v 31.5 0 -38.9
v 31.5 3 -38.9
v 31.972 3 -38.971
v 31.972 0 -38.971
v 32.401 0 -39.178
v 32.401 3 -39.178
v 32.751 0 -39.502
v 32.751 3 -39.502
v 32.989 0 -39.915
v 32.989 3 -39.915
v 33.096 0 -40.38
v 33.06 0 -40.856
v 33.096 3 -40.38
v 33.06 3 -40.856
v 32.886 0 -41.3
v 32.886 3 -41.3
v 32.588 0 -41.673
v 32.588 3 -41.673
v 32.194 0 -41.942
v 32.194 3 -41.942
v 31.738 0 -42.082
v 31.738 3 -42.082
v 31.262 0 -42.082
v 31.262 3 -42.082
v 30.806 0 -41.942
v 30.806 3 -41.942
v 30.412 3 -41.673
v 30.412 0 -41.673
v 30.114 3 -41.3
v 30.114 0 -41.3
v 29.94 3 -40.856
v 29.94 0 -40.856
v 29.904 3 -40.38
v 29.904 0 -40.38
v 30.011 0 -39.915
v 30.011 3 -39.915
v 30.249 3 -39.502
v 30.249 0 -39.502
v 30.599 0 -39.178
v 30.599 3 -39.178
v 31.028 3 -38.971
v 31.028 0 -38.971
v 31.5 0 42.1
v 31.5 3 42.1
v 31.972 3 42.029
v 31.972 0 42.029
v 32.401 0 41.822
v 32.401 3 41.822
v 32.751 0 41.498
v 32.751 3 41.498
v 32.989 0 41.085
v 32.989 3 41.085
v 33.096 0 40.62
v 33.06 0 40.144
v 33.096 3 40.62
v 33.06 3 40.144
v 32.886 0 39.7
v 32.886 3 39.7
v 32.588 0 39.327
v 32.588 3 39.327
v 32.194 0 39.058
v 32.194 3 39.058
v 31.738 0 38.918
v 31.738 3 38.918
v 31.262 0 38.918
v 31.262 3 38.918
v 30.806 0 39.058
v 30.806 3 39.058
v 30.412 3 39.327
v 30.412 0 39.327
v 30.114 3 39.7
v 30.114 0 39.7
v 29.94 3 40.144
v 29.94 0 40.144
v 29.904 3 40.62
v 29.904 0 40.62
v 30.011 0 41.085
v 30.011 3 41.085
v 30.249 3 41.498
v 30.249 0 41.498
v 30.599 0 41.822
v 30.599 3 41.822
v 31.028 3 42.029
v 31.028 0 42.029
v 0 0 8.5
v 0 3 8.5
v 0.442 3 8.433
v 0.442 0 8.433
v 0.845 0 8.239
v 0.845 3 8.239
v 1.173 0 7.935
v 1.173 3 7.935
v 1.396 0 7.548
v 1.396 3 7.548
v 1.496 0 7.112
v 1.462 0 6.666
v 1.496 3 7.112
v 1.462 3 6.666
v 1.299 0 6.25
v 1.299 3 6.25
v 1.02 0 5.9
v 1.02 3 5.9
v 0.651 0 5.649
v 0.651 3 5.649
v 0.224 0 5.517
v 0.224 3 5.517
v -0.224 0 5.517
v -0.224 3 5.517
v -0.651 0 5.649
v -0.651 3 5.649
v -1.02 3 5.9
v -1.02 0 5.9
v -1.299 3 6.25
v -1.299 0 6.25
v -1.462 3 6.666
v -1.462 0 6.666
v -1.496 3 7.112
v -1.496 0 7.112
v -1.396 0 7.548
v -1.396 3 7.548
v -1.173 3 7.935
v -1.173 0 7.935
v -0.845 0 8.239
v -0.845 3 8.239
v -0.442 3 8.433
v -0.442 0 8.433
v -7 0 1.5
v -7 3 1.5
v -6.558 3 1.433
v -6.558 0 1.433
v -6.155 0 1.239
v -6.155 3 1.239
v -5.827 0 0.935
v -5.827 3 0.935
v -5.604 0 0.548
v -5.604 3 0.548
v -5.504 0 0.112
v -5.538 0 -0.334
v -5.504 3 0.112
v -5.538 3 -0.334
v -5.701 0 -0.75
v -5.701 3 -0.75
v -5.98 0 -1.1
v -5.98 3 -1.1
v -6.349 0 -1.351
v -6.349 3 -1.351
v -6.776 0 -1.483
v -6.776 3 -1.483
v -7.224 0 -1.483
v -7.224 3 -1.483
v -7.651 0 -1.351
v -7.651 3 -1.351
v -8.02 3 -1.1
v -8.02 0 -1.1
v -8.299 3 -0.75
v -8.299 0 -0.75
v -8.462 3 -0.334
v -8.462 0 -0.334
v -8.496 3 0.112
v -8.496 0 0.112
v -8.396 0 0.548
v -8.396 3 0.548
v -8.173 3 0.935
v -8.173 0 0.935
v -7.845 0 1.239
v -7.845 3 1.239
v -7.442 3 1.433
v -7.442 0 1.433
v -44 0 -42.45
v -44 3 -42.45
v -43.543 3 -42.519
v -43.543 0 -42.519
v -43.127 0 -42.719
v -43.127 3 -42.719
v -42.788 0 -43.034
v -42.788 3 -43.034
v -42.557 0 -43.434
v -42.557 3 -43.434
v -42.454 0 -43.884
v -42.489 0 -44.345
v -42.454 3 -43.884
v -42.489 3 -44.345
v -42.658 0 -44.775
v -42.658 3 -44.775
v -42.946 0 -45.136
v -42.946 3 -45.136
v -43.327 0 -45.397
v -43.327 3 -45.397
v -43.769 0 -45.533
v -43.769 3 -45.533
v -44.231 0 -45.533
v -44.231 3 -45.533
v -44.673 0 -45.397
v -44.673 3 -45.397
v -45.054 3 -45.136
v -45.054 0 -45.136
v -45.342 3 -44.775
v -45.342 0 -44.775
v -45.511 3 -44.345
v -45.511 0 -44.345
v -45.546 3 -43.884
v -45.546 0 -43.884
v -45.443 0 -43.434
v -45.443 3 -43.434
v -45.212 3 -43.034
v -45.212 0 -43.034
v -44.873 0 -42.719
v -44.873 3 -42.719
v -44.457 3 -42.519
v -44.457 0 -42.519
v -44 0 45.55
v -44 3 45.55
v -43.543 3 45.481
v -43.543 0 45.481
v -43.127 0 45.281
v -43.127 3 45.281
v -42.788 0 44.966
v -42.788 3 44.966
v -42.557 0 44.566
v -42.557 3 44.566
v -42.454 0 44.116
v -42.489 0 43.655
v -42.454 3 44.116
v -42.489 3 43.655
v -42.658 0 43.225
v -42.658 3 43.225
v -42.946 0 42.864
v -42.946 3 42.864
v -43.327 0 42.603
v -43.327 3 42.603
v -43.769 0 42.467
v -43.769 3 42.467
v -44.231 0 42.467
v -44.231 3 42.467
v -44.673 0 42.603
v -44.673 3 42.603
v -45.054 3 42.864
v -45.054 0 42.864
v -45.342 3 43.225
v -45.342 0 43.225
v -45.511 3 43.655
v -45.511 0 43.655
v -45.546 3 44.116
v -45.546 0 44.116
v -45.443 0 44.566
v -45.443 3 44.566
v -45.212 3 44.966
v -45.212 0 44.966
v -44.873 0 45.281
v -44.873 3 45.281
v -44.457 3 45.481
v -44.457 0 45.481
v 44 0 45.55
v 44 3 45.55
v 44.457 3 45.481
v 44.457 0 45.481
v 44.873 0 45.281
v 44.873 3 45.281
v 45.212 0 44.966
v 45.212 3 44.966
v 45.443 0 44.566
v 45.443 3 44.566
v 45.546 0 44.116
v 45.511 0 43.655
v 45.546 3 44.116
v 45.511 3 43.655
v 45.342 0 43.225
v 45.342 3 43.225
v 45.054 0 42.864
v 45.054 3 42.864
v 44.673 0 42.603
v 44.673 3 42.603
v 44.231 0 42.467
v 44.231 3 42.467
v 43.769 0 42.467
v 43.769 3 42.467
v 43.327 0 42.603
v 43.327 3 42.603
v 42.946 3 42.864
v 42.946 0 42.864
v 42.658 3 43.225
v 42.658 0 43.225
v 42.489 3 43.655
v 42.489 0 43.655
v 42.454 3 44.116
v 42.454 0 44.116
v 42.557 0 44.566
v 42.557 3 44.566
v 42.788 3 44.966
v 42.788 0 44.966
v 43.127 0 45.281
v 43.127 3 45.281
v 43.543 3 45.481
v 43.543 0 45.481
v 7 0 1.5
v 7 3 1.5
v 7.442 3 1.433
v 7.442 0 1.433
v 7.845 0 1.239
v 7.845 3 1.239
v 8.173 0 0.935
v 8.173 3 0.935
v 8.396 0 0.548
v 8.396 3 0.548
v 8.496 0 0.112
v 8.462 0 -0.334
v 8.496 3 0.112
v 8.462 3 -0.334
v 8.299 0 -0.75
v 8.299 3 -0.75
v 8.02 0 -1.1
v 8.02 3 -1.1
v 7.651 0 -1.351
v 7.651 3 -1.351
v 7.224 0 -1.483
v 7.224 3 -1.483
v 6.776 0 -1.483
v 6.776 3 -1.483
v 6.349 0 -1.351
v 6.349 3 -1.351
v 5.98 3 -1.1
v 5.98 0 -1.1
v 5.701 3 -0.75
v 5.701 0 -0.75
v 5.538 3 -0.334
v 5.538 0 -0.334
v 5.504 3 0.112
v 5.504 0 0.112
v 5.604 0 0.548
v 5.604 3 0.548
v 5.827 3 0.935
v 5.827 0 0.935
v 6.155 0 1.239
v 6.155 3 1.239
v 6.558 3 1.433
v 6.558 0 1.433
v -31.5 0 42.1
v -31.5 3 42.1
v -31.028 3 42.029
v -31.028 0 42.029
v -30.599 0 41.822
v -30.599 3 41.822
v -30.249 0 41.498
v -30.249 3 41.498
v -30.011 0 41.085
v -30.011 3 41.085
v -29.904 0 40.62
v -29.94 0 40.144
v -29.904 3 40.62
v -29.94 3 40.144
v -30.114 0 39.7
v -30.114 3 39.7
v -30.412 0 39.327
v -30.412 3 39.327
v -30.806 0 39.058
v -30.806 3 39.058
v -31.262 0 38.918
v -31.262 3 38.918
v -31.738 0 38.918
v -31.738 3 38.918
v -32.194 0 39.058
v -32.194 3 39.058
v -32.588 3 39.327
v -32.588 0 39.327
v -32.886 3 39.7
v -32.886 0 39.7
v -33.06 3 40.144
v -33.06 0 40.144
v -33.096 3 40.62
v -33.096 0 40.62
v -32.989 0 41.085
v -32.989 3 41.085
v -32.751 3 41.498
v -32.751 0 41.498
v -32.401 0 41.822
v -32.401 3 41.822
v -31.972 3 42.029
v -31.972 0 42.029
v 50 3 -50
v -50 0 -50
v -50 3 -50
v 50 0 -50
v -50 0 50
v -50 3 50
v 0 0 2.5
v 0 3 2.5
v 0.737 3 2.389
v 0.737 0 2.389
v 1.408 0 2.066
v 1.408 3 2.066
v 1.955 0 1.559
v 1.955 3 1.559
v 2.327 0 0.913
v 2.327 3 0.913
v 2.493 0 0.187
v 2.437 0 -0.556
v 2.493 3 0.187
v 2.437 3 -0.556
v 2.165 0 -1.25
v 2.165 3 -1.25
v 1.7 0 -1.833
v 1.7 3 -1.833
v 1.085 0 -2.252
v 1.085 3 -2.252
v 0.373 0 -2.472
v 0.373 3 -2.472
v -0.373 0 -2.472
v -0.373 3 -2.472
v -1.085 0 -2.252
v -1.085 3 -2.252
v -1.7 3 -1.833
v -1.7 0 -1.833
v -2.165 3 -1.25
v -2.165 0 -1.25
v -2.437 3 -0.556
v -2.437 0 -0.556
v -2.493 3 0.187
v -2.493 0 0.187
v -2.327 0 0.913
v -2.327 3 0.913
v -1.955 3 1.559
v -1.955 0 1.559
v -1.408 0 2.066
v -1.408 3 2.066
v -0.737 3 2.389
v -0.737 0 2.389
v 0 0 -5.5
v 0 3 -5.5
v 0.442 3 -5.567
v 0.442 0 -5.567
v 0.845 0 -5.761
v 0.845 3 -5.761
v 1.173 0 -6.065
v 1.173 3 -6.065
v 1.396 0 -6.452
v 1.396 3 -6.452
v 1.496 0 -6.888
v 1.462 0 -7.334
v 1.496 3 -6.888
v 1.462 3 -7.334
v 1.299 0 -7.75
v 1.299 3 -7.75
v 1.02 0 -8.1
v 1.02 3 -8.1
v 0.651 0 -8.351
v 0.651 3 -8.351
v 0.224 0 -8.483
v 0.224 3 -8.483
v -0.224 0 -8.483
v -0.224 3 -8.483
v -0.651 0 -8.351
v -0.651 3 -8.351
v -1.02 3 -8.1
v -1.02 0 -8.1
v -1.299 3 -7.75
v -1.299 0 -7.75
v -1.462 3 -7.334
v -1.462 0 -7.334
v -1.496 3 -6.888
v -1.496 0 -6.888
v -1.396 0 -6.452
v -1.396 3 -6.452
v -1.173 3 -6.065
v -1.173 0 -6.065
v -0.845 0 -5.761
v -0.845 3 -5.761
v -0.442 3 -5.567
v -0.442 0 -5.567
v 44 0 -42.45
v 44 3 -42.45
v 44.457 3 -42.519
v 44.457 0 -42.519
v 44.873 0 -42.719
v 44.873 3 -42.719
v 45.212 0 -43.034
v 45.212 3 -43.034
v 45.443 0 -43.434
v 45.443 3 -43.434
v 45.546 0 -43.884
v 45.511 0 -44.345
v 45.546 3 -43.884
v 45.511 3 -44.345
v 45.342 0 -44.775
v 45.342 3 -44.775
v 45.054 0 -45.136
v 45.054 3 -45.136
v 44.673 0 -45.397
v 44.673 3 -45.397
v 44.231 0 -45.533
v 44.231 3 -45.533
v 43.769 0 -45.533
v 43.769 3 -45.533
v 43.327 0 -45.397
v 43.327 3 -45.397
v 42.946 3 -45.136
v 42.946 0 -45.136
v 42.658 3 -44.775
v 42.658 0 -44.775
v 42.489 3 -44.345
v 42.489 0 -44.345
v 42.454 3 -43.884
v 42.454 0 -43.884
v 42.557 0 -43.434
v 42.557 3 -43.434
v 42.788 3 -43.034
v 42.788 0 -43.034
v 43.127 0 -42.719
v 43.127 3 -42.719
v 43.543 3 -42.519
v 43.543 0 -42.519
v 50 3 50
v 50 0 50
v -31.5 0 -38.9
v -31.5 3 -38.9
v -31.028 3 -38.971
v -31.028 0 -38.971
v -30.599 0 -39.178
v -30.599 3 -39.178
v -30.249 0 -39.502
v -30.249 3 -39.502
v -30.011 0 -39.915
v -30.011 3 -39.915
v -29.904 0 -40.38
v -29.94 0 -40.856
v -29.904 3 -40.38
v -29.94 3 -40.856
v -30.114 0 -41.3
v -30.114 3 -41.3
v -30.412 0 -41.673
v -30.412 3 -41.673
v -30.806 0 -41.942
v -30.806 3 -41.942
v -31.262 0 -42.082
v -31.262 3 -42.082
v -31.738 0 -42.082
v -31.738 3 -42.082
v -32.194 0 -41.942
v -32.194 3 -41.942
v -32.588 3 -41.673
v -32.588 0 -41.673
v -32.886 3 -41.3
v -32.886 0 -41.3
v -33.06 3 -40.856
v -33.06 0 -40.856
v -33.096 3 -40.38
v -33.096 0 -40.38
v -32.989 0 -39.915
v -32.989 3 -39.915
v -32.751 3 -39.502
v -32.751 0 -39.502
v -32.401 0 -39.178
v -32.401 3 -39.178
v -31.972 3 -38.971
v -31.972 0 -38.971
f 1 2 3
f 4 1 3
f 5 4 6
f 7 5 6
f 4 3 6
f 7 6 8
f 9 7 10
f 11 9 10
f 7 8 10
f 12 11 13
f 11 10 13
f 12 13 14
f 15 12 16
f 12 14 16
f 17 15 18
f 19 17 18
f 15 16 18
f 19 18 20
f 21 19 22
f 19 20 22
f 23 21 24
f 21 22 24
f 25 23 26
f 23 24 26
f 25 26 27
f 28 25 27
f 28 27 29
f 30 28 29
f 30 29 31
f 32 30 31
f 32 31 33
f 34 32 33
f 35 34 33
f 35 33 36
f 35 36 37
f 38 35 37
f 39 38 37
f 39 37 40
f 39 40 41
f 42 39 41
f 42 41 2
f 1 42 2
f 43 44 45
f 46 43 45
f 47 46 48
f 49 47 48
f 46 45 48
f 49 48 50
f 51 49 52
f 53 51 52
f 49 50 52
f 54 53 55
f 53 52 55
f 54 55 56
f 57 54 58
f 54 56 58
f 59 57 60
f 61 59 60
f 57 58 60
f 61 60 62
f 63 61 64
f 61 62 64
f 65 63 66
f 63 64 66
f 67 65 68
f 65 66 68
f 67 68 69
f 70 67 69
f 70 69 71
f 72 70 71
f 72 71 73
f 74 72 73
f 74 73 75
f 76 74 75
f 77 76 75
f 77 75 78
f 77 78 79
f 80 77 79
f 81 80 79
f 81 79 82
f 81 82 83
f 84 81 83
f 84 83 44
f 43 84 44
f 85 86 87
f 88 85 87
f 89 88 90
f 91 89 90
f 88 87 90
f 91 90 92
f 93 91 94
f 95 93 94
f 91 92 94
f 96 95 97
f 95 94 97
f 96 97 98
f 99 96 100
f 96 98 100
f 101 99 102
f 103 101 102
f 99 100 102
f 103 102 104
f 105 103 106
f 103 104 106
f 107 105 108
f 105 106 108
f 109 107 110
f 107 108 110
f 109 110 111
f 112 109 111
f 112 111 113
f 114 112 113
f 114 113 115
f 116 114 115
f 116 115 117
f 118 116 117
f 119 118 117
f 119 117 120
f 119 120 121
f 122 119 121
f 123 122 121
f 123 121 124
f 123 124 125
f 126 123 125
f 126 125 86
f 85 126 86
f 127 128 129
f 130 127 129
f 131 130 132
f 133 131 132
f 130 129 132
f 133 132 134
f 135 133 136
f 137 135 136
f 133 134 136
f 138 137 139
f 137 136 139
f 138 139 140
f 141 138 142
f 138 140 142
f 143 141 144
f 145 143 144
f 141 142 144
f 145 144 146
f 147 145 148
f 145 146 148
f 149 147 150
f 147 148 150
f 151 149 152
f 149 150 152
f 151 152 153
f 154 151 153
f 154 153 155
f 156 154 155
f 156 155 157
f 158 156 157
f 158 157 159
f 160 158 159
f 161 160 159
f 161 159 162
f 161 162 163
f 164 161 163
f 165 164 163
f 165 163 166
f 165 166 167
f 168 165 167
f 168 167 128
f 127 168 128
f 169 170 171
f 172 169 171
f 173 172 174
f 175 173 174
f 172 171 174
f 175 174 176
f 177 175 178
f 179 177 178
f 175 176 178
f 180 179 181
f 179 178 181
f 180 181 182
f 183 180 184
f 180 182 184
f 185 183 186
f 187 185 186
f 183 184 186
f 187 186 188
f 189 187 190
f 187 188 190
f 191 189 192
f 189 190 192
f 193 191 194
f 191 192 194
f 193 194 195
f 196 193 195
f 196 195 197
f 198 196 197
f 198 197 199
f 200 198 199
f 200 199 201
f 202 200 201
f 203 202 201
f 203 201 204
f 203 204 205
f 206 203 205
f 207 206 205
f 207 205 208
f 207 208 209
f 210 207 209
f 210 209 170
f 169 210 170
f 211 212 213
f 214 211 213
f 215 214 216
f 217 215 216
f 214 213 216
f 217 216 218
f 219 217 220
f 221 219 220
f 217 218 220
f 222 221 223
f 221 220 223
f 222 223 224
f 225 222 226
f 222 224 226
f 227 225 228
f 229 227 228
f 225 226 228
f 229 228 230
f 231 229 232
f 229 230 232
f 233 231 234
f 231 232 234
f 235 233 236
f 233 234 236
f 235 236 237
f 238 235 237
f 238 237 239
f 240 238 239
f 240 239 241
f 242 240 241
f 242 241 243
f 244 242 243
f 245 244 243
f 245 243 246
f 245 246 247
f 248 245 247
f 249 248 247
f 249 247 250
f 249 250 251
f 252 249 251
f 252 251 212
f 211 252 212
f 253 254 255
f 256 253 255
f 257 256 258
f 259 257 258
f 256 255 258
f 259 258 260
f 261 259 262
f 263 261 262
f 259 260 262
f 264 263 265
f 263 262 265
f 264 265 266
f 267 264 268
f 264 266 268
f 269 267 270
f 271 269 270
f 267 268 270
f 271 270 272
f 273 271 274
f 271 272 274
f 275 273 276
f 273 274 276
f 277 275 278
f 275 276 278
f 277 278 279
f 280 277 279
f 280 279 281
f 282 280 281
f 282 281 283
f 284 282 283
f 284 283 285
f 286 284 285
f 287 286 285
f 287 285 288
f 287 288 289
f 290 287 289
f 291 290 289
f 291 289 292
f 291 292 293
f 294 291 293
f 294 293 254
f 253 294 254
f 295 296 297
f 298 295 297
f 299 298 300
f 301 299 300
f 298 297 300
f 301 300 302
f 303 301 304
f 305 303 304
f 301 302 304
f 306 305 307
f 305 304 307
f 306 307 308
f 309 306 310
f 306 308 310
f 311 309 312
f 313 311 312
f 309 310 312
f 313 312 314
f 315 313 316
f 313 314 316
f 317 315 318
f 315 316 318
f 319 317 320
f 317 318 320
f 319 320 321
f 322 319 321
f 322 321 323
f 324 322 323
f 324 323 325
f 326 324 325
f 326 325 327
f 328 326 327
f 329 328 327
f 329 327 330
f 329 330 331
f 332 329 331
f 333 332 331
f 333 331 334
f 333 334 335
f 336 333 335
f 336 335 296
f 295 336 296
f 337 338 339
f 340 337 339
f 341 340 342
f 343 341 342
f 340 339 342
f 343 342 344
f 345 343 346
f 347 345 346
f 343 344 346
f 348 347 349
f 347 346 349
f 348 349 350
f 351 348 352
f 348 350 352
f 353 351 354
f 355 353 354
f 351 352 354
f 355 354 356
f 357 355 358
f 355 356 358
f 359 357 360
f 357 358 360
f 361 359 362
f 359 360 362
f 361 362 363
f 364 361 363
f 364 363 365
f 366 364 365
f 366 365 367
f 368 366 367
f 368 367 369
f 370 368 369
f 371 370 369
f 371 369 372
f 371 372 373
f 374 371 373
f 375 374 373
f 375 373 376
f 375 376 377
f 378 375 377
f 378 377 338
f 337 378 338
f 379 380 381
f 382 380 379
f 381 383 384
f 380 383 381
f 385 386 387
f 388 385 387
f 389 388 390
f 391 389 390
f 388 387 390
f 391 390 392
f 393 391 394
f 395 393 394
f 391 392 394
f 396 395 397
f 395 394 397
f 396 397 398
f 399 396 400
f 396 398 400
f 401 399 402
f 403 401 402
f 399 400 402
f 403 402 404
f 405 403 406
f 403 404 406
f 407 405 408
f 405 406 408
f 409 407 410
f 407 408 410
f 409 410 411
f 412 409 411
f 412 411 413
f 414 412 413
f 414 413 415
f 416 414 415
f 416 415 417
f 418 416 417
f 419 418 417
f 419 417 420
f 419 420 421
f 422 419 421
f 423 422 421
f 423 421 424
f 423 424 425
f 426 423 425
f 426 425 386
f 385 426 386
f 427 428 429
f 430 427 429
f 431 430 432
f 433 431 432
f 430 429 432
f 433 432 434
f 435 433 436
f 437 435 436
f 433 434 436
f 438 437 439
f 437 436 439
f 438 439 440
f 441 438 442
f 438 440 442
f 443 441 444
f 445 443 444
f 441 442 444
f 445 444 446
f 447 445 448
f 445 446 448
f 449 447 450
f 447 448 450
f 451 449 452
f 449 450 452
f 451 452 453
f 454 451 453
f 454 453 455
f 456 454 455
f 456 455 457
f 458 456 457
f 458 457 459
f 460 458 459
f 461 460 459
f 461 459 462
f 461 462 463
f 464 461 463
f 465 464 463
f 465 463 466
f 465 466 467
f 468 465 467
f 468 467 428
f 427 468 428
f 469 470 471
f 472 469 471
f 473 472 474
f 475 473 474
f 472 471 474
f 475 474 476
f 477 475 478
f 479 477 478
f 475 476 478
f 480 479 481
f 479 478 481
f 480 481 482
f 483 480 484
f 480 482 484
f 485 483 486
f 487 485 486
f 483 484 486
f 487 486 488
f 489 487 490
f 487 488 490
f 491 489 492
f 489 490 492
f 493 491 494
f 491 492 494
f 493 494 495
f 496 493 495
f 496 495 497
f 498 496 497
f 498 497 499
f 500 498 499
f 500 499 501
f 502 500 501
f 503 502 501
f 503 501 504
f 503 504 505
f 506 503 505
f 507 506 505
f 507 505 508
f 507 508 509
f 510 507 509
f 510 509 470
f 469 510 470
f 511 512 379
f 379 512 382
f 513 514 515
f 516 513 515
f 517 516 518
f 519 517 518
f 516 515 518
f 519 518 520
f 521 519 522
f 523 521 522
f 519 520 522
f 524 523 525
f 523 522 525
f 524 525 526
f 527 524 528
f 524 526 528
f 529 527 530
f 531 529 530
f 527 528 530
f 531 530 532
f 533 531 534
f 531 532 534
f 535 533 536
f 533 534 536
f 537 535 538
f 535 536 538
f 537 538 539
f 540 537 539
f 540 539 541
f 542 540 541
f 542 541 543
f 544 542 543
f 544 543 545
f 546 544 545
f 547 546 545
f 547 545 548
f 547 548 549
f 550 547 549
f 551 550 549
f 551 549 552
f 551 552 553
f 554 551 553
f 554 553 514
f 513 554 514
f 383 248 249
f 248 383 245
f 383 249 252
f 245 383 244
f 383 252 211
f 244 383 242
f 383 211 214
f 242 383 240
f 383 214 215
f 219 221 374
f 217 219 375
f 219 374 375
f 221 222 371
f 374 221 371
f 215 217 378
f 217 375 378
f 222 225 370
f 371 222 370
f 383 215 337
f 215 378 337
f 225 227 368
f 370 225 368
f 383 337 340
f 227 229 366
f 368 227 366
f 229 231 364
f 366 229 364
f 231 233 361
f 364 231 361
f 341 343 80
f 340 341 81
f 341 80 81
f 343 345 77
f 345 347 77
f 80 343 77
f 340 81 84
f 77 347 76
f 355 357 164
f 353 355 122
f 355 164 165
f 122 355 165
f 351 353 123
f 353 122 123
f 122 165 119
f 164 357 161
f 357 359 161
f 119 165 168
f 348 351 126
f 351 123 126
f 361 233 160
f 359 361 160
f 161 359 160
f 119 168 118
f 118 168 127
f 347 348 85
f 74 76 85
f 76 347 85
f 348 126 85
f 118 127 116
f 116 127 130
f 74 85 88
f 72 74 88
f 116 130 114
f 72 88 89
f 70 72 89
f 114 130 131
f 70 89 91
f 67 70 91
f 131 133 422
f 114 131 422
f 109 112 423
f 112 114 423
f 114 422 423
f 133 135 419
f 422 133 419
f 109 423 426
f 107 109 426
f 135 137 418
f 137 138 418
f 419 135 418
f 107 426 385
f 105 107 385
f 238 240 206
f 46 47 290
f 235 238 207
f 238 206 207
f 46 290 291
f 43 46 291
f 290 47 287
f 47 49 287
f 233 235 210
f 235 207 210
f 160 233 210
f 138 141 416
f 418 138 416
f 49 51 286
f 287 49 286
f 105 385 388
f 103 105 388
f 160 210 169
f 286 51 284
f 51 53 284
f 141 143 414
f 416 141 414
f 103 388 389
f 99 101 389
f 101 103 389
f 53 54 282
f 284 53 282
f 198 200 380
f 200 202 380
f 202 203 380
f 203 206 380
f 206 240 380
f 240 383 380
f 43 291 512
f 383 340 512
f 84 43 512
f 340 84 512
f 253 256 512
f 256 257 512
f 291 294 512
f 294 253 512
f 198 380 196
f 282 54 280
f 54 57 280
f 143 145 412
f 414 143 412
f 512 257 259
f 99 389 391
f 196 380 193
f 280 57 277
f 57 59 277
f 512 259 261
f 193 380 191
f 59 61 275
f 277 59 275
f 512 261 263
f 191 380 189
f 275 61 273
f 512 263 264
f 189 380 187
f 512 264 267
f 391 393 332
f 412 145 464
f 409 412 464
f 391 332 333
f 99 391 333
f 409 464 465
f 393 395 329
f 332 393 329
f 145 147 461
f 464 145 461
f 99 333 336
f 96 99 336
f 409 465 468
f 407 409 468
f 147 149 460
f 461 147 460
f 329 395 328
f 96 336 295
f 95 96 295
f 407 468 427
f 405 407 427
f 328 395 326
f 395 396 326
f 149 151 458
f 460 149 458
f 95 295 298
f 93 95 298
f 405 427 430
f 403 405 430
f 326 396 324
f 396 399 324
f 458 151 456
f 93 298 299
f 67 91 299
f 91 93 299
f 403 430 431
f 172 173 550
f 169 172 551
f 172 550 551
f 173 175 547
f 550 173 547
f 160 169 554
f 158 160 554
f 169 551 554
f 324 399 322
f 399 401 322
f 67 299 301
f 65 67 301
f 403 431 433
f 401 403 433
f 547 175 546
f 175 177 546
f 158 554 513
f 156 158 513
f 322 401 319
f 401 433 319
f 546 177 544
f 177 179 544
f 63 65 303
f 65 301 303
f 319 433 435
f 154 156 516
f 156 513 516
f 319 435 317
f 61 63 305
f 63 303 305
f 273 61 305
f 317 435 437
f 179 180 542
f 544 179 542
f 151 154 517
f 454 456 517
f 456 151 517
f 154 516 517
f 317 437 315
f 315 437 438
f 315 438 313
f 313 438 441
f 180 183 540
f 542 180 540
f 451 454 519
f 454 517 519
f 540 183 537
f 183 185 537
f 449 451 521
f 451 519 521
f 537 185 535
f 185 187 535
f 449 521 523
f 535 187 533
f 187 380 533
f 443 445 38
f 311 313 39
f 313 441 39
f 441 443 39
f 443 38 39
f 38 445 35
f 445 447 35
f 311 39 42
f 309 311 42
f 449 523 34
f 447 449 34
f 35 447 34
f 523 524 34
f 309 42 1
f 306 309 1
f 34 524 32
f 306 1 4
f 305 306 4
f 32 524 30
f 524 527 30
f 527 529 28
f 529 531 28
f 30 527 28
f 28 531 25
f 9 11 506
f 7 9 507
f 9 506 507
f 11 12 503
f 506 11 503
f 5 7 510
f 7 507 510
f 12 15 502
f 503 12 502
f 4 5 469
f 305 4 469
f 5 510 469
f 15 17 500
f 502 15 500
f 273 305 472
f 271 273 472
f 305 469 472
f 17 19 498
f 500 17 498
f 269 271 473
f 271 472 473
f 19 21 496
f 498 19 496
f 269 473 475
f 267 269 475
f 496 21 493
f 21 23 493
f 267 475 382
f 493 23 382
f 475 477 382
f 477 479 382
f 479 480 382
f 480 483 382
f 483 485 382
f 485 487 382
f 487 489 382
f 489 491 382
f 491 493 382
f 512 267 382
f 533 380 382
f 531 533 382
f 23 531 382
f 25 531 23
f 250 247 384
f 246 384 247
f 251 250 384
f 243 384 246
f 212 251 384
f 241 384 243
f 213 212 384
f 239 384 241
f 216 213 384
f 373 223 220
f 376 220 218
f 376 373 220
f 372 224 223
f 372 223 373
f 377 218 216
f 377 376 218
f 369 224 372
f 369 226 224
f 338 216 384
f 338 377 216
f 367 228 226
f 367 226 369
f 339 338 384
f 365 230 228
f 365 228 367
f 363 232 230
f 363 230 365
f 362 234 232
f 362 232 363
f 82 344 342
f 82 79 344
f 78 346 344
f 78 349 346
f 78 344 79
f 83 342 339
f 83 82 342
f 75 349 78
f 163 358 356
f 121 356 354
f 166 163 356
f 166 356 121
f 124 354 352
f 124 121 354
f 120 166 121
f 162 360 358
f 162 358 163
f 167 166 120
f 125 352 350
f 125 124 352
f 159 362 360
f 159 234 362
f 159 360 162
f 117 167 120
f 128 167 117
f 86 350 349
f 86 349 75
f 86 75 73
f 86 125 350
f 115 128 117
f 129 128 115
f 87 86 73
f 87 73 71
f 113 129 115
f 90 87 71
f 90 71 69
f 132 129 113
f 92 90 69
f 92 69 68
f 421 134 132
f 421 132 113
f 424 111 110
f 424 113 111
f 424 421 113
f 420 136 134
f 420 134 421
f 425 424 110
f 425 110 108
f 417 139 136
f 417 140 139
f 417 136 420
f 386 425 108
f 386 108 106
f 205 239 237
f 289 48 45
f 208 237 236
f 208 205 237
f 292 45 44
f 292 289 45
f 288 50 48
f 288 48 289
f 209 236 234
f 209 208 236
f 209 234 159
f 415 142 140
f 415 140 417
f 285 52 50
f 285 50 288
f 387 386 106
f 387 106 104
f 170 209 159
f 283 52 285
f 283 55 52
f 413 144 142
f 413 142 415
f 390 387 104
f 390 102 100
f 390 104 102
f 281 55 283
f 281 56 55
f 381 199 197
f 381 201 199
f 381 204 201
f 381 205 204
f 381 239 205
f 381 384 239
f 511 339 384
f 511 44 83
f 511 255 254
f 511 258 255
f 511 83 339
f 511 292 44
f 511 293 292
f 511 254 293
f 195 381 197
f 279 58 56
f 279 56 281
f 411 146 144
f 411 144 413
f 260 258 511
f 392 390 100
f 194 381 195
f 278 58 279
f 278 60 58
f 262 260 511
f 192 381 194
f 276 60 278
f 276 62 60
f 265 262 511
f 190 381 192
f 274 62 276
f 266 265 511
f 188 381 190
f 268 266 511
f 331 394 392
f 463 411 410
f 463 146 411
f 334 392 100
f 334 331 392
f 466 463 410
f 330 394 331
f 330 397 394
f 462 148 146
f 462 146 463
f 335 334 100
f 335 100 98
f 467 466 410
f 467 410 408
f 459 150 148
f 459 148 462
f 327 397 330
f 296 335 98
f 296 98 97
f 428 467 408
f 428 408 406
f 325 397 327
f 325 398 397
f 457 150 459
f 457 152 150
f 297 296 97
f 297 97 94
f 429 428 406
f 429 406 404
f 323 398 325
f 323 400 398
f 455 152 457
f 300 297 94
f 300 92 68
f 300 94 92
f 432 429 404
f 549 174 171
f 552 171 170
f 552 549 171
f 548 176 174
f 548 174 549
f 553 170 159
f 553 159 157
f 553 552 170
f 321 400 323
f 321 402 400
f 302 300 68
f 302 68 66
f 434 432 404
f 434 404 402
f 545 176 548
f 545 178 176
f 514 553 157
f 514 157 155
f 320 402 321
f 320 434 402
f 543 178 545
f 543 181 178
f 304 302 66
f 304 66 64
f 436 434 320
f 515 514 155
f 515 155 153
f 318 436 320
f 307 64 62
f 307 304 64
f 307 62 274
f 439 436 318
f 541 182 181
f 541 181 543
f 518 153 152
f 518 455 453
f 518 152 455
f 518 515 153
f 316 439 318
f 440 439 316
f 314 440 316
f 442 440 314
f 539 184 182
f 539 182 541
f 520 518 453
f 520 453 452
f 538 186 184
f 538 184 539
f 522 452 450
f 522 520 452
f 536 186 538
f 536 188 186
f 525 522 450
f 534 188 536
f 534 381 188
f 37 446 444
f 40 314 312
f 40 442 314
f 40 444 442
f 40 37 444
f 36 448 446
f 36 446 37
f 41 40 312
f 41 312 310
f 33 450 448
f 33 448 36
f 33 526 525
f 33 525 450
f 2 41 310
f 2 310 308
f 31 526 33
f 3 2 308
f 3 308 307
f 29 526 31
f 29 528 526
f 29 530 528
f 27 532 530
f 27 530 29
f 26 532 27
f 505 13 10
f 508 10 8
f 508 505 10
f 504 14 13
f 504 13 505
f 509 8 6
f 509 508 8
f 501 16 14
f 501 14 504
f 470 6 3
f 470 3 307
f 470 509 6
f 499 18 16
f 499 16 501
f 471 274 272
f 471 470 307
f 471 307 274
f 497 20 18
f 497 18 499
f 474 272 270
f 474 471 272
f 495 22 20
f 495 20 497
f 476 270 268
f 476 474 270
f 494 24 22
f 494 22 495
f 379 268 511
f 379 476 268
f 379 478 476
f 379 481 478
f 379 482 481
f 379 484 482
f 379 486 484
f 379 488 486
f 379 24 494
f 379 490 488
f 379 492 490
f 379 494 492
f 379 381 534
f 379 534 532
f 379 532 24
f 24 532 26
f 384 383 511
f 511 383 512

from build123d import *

# Parameters (mm, degrees)
CROQUIS1_W              = 100
CROQUIS1_H              = 100
SALIENTE_EXTRUIR1_DEPTH = 3
CROQUIS6_R              = 1.55
CORTAR_EXTRUIR4_DEPTH   = 10
CROQUIS7_R              = 1.6
CORTAR_EXTRUIR5_DEPTH   = 10
CROQUIS8_R              = 2.5
CROQUIS8_R_2            = 1.5
CORTAR_EXTRUIR6_DEPTH   = 10


with BuildPart() as part:
    # Croquis1 → Saliente-Extruir1 (new body)
    with BuildSketch(Plane(origin=(0, 0, 0), x_dir=(1, 0, 0), z_dir=(0, 1, 0))):
        Rectangle(CROQUIS1_W, CROQUIS1_H)
    extrude(amount=SALIENTE_EXTRUIR1_DEPTH)

    # Croquis6 → Cortar-Extruir4 (cut)
    with BuildSketch(Plane(origin=(0, 3, 0), x_dir=(1, 0, 0), z_dir=(0, 1, 0))):
        with Locations(Location((-44, 44, 0), (0, 0, 270))):  # turned: the seam where the file's is
            Circle(CROQUIS6_R)
        with Locations(Location((44, 44, 0), (0, 0, 270))):  # turned: the seam where the file's is
            Circle(CROQUIS6_R)
        with Locations(Location((44, -44, 0), (0, 0, 270))):  # turned: the seam where the file's is
            Circle(CROQUIS6_R)
        with Locations(Location((-44, -44, 0), (0, 0, 270))):  # turned: the seam where the file's is
            Circle(CROQUIS6_R)
    extrude(amount=-CORTAR_EXTRUIR4_DEPTH, mode=Mode.SUBTRACT)

    # Croquis7 → Cortar-Extruir5 (cut)
    with BuildSketch(Plane(origin=(0, 3, 0), x_dir=(1, 0, 0), z_dir=(0, 1, 0))):
        with Locations(Location((-31.5, 40.5, 0), (0, 0, 270))):  # turned: the seam where the file's is
            Circle(CROQUIS7_R)
        with Locations(Location((31.5, 40.5, 0), (0, 0, 270))):  # turned: the seam where the file's is
            Circle(CROQUIS7_R)
        with Locations(Location((-31.5, -40.5, 0), (0, 0, 270))):  # turned: the seam where the file's is
            Circle(CROQUIS7_R)
        with Locations(Location((31.5, -40.5, 0), (0, 0, 270))):  # turned: the seam where the file's is
            Circle(CROQUIS7_R)
    extrude(amount=-CORTAR_EXTRUIR5_DEPTH, mode=Mode.SUBTRACT)

    # Croquis8 → Cortar-Extruir6 (cut)
    with BuildSketch(Plane(origin=(0, 3, 0), x_dir=(1, 0, 0), z_dir=(0, 1, 0))):
        with Locations(Location((0, 0, 0), (0, 0, 270))):  # turned: the seam where the file's is
            Circle(CROQUIS8_R)
        with Locations(Location((0, 7, 0), (0, 0, 270))):  # turned: the seam where the file's is
            Circle(CROQUIS8_R_2)
        with Locations(Location((7, 0, 0), (0, 0, 270))):  # turned: the seam where the file's is
            Circle(CROQUIS8_R_2)
        with Locations(Location((0, -7, 0), (0, 0, 270))):  # turned: the seam where the file's is
            Circle(CROQUIS8_R_2)
        with Locations(Location((-7, 0, 0), (0, 0, 270))):  # turned: the seam where the file's is
            Circle(CROQUIS8_R_2)
    extrude(amount=-CORTAR_EXTRUIR6_DEPTH, mode=Mode.SUBTRACT)


solid = part.part
